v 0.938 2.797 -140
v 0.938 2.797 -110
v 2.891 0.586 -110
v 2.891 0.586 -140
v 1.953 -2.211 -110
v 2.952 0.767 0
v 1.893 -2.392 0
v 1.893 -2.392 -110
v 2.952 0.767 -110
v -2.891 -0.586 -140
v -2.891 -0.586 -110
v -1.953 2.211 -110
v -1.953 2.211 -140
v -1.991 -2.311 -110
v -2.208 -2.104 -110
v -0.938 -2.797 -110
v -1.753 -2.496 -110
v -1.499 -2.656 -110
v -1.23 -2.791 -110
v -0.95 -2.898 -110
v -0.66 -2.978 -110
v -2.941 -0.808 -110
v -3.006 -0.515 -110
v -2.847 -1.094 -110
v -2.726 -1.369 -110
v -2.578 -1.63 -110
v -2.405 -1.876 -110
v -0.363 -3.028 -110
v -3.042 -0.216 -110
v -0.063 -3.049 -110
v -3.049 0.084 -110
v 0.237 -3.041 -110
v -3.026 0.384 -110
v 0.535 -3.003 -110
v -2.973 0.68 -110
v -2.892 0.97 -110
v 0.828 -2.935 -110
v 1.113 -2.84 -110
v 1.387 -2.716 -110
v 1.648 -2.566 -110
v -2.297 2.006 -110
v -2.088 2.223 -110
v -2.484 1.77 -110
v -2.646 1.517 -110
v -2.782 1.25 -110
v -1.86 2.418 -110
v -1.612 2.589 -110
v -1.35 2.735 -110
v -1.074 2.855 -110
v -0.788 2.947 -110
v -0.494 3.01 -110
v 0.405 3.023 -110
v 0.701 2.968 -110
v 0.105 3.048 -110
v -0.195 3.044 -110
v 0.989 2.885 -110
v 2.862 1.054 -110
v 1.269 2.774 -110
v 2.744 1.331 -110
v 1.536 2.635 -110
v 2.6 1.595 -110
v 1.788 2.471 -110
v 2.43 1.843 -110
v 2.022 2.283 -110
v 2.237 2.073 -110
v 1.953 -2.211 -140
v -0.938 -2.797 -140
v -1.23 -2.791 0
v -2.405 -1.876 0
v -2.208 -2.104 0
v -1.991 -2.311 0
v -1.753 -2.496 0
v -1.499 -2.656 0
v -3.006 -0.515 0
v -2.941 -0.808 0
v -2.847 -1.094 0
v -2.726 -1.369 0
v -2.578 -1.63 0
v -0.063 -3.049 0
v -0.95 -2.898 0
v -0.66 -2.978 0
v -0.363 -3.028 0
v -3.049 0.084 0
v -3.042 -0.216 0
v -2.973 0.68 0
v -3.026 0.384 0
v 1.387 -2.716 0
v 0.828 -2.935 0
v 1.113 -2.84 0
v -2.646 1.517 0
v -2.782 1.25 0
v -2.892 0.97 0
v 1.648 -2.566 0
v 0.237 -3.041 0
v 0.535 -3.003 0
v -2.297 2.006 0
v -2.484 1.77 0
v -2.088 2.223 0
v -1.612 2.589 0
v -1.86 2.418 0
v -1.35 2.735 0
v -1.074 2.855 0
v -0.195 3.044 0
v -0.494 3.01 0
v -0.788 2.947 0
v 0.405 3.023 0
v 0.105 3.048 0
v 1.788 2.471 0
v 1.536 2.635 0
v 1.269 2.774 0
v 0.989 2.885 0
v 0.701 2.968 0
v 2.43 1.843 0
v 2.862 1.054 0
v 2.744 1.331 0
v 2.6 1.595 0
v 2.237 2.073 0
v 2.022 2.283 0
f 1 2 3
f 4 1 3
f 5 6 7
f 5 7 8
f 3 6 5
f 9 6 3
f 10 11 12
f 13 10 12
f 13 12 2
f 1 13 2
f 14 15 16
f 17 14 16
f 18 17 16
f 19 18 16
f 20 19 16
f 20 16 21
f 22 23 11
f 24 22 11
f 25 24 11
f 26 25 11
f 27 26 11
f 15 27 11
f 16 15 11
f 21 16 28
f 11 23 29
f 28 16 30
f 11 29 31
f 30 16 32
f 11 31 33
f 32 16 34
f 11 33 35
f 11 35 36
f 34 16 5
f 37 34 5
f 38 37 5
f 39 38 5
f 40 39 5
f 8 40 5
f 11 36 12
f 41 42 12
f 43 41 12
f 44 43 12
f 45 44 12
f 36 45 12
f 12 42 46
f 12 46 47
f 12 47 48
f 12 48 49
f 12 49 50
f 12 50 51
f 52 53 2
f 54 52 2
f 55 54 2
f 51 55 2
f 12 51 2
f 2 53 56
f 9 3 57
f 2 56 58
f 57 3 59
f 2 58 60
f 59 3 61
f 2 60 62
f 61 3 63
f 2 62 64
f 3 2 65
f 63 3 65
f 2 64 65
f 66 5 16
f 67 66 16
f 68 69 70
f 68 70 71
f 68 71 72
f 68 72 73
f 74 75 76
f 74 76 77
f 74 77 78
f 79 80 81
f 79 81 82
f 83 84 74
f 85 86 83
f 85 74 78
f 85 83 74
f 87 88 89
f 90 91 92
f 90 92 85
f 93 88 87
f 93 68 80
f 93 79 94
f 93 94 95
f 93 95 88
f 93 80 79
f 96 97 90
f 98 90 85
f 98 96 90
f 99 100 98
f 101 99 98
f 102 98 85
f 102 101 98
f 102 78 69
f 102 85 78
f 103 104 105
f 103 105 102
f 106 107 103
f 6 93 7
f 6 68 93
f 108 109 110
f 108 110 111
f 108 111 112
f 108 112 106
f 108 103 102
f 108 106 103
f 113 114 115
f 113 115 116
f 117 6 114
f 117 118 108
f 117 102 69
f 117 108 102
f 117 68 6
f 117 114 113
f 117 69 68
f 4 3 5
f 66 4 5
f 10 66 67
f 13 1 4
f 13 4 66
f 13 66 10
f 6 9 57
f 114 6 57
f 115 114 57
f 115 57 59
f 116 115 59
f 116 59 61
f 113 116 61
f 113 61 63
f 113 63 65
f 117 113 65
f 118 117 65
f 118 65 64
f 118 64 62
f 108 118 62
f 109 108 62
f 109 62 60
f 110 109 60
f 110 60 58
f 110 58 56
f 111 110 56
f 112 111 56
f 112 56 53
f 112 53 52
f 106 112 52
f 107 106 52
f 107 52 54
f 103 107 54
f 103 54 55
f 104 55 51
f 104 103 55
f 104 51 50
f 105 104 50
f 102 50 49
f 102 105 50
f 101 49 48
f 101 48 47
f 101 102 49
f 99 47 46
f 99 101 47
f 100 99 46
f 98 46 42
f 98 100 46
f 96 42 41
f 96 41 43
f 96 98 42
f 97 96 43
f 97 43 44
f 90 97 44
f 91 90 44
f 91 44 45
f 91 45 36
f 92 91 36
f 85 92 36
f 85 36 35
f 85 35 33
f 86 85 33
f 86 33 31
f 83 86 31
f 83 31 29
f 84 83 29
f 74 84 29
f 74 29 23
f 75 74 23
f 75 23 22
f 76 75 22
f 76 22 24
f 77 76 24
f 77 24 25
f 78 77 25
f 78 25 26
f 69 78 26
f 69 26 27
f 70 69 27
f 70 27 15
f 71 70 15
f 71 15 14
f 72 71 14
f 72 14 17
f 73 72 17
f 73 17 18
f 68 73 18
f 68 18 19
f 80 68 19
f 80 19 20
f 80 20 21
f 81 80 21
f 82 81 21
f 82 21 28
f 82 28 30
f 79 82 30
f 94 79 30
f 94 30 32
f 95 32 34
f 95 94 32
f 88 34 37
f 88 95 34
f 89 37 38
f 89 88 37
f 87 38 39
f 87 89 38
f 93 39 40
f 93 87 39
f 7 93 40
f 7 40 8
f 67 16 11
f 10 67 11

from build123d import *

# Parameters (mm, degrees)
SKETCH_1_R          = 3.05
EXTRUDE_1_DEPTH     = 110
EXTRUDE_2_DEPTH     = 30
SKETCH_3_W          = 148.461439859
SKETCH_3_H          = 21.991651446
CUT_EXTRUDE_1_DEPTH = 141.160128777


with BuildPart() as part:
    # 草图1 → 凸台-拉伸1 (new body)
    with BuildSketch(Plane.XY):
        Circle(SKETCH_1_R)
    extrude(amount=-EXTRUDE_1_DEPTH)

    # 草图2 → 凸台-拉伸2 (add)
    with BuildSketch(Plane(origin=(0, 0, -110), x_dir=(-1, 0, 0), z_dir=(0, 0, -1))):
        Polygon((1.953354878, 2.210634461), (-0.937788163, 2.796972178), (-2.891143041, 0.586337717), (-1.953354878, -2.210634461), (0.937788163, -2.796972178), (2.891143041, -0.586337717), align=None)
    extrude(amount=EXTRUDE_2_DEPTH)

    # 草图3 → 切除-拉伸1 (cut, through all)
    with BuildSketch(Plane(origin=(2.422248959, -0.812148372, 0), x_dir=(0, 0, -1), z_dir=(0.9481261618829849, -0.3178942924197286, 0))):
        with Locations((68.647762533, -0.511106719)):
            Rectangle(SKETCH_3_W, SKETCH_3_H)
    extrude(amount=CUT_EXTRUDE_1_DEPTH, mode=Mode.SUBTRACT)


solid = part.part
